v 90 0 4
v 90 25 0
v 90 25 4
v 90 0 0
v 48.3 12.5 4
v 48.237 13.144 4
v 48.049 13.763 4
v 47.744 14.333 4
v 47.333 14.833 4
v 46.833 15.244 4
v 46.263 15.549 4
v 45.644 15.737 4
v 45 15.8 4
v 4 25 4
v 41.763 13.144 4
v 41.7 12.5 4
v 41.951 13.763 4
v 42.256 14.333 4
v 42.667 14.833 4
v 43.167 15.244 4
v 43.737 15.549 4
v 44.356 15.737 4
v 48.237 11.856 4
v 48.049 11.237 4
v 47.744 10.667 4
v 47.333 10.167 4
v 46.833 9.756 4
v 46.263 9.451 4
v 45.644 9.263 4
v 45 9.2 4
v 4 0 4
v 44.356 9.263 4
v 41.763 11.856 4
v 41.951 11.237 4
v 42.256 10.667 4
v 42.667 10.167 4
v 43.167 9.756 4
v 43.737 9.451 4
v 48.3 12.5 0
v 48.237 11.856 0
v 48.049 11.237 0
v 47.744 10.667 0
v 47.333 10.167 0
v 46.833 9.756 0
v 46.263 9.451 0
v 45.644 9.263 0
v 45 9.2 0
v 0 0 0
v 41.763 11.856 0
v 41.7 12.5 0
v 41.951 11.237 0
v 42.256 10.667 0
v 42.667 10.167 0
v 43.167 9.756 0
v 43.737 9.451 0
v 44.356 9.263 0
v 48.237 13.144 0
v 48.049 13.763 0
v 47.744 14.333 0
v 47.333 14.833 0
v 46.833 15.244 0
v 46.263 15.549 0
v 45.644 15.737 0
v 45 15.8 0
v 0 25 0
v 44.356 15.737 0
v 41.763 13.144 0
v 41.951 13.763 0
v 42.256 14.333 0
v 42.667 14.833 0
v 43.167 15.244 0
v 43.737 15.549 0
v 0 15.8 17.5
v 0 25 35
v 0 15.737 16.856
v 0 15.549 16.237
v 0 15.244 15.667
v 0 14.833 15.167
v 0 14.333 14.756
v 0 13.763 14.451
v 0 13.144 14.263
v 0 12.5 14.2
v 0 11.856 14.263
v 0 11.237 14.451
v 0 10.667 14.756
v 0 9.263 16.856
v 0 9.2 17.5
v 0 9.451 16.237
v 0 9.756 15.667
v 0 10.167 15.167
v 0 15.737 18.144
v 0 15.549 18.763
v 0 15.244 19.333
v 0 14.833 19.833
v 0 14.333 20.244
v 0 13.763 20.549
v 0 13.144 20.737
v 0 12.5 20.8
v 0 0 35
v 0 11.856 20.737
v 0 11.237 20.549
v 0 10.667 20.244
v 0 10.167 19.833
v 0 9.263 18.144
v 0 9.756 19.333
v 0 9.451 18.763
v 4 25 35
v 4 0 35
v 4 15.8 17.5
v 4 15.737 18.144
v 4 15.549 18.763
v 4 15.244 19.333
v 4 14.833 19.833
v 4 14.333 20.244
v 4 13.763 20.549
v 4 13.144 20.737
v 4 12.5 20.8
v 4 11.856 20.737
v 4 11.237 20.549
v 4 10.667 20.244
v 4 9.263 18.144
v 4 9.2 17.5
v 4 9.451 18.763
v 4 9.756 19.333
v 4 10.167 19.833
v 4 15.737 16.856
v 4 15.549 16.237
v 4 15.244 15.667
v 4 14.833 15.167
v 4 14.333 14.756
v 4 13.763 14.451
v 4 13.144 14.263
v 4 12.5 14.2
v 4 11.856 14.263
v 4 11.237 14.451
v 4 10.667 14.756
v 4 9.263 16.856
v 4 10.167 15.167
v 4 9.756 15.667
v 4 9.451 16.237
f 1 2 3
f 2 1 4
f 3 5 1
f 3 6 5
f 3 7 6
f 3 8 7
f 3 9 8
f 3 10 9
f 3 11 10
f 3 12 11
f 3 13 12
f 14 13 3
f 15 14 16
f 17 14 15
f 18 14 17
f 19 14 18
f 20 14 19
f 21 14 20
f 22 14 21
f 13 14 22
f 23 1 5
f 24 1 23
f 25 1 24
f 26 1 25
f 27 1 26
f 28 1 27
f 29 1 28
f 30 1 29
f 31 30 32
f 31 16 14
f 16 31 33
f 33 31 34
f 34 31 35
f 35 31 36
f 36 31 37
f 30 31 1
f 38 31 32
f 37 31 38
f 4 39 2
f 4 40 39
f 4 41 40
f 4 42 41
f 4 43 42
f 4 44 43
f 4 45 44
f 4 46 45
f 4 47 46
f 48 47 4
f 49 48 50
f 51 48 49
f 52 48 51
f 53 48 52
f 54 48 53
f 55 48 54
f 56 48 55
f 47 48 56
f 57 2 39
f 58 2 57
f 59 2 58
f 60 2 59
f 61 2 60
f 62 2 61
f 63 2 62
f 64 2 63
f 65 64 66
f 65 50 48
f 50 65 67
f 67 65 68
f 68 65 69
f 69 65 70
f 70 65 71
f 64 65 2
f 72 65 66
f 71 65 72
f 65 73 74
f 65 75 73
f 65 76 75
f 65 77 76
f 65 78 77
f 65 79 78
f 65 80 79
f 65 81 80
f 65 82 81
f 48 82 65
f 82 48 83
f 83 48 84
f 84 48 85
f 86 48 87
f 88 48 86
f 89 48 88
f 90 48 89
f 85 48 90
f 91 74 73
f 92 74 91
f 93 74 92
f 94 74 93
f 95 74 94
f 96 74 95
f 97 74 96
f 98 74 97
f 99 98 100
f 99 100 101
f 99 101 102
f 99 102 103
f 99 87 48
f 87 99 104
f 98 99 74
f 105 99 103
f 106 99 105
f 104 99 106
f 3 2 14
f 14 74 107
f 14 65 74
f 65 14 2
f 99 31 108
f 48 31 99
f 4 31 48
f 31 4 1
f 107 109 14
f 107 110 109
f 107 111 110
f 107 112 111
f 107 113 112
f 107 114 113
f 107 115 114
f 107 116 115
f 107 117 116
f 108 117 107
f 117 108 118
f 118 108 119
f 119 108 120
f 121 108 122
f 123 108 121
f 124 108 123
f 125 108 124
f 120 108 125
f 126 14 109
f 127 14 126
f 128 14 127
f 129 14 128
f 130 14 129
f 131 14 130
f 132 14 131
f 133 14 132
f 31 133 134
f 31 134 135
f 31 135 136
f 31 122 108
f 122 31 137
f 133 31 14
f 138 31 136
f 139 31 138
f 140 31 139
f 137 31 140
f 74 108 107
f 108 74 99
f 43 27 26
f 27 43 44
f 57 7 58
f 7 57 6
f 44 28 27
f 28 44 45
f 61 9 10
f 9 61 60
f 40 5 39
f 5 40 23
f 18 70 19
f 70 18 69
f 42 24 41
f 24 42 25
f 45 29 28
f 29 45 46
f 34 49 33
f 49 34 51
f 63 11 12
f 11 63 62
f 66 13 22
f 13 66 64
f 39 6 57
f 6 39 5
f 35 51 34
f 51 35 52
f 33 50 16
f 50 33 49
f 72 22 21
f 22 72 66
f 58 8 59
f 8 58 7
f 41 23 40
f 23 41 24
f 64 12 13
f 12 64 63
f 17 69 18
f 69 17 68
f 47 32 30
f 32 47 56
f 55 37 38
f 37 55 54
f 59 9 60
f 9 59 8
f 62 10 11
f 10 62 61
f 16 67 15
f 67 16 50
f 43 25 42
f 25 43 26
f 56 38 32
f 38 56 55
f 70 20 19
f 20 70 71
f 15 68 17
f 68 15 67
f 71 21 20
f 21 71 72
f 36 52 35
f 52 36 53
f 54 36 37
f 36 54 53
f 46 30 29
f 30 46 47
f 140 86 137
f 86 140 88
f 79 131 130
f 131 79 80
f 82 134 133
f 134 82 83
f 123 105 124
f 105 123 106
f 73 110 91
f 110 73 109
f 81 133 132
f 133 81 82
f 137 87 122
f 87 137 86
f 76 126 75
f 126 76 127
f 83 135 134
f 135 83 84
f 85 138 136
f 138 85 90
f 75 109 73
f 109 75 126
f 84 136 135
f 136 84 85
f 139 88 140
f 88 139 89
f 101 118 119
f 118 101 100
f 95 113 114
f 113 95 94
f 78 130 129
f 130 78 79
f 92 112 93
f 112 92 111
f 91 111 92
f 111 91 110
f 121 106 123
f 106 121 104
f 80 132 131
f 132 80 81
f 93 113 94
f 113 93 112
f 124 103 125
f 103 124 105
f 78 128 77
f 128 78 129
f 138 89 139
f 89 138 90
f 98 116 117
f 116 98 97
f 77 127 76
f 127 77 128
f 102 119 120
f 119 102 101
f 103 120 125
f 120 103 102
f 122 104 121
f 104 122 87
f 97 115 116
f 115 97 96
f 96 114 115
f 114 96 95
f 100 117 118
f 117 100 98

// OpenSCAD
$fn = 32;

// ----------------------------------------------------------------------
// L-bracket: 90 x 25 x 35 mm
// ----------------------------------------------------------------------

// --- parameters (mm) ---
run_out = 90;             // horizontal leg, X
rise = 35;                // vertical leg, Z
bracket_w = 25;           // bracket depth, Y
sheet_t = 4;              // plate thickness
hole_d = 6.6;             // clearance for M6

module hole_z(px, py) {
  translate([px, py, -2.5]) cylinder(h = sheet_t + 5, d = hole_d);
}
module hole_x(pz, py) {
  translate([-2.5, py, pz]) rotate([0, 90, 0]) cylinder(h = sheet_t + 5, d = hole_d);
}

difference() {
  union() {
    /* horizontal leg */
    cube([run_out, bracket_w, sheet_t]);
    /* vertical leg, overlapping the corner block */
    cube([sheet_t, bracket_w, rise]);
  }
  hole_z(45, 12.5);
  hole_x(17.5, 12.5);
}
